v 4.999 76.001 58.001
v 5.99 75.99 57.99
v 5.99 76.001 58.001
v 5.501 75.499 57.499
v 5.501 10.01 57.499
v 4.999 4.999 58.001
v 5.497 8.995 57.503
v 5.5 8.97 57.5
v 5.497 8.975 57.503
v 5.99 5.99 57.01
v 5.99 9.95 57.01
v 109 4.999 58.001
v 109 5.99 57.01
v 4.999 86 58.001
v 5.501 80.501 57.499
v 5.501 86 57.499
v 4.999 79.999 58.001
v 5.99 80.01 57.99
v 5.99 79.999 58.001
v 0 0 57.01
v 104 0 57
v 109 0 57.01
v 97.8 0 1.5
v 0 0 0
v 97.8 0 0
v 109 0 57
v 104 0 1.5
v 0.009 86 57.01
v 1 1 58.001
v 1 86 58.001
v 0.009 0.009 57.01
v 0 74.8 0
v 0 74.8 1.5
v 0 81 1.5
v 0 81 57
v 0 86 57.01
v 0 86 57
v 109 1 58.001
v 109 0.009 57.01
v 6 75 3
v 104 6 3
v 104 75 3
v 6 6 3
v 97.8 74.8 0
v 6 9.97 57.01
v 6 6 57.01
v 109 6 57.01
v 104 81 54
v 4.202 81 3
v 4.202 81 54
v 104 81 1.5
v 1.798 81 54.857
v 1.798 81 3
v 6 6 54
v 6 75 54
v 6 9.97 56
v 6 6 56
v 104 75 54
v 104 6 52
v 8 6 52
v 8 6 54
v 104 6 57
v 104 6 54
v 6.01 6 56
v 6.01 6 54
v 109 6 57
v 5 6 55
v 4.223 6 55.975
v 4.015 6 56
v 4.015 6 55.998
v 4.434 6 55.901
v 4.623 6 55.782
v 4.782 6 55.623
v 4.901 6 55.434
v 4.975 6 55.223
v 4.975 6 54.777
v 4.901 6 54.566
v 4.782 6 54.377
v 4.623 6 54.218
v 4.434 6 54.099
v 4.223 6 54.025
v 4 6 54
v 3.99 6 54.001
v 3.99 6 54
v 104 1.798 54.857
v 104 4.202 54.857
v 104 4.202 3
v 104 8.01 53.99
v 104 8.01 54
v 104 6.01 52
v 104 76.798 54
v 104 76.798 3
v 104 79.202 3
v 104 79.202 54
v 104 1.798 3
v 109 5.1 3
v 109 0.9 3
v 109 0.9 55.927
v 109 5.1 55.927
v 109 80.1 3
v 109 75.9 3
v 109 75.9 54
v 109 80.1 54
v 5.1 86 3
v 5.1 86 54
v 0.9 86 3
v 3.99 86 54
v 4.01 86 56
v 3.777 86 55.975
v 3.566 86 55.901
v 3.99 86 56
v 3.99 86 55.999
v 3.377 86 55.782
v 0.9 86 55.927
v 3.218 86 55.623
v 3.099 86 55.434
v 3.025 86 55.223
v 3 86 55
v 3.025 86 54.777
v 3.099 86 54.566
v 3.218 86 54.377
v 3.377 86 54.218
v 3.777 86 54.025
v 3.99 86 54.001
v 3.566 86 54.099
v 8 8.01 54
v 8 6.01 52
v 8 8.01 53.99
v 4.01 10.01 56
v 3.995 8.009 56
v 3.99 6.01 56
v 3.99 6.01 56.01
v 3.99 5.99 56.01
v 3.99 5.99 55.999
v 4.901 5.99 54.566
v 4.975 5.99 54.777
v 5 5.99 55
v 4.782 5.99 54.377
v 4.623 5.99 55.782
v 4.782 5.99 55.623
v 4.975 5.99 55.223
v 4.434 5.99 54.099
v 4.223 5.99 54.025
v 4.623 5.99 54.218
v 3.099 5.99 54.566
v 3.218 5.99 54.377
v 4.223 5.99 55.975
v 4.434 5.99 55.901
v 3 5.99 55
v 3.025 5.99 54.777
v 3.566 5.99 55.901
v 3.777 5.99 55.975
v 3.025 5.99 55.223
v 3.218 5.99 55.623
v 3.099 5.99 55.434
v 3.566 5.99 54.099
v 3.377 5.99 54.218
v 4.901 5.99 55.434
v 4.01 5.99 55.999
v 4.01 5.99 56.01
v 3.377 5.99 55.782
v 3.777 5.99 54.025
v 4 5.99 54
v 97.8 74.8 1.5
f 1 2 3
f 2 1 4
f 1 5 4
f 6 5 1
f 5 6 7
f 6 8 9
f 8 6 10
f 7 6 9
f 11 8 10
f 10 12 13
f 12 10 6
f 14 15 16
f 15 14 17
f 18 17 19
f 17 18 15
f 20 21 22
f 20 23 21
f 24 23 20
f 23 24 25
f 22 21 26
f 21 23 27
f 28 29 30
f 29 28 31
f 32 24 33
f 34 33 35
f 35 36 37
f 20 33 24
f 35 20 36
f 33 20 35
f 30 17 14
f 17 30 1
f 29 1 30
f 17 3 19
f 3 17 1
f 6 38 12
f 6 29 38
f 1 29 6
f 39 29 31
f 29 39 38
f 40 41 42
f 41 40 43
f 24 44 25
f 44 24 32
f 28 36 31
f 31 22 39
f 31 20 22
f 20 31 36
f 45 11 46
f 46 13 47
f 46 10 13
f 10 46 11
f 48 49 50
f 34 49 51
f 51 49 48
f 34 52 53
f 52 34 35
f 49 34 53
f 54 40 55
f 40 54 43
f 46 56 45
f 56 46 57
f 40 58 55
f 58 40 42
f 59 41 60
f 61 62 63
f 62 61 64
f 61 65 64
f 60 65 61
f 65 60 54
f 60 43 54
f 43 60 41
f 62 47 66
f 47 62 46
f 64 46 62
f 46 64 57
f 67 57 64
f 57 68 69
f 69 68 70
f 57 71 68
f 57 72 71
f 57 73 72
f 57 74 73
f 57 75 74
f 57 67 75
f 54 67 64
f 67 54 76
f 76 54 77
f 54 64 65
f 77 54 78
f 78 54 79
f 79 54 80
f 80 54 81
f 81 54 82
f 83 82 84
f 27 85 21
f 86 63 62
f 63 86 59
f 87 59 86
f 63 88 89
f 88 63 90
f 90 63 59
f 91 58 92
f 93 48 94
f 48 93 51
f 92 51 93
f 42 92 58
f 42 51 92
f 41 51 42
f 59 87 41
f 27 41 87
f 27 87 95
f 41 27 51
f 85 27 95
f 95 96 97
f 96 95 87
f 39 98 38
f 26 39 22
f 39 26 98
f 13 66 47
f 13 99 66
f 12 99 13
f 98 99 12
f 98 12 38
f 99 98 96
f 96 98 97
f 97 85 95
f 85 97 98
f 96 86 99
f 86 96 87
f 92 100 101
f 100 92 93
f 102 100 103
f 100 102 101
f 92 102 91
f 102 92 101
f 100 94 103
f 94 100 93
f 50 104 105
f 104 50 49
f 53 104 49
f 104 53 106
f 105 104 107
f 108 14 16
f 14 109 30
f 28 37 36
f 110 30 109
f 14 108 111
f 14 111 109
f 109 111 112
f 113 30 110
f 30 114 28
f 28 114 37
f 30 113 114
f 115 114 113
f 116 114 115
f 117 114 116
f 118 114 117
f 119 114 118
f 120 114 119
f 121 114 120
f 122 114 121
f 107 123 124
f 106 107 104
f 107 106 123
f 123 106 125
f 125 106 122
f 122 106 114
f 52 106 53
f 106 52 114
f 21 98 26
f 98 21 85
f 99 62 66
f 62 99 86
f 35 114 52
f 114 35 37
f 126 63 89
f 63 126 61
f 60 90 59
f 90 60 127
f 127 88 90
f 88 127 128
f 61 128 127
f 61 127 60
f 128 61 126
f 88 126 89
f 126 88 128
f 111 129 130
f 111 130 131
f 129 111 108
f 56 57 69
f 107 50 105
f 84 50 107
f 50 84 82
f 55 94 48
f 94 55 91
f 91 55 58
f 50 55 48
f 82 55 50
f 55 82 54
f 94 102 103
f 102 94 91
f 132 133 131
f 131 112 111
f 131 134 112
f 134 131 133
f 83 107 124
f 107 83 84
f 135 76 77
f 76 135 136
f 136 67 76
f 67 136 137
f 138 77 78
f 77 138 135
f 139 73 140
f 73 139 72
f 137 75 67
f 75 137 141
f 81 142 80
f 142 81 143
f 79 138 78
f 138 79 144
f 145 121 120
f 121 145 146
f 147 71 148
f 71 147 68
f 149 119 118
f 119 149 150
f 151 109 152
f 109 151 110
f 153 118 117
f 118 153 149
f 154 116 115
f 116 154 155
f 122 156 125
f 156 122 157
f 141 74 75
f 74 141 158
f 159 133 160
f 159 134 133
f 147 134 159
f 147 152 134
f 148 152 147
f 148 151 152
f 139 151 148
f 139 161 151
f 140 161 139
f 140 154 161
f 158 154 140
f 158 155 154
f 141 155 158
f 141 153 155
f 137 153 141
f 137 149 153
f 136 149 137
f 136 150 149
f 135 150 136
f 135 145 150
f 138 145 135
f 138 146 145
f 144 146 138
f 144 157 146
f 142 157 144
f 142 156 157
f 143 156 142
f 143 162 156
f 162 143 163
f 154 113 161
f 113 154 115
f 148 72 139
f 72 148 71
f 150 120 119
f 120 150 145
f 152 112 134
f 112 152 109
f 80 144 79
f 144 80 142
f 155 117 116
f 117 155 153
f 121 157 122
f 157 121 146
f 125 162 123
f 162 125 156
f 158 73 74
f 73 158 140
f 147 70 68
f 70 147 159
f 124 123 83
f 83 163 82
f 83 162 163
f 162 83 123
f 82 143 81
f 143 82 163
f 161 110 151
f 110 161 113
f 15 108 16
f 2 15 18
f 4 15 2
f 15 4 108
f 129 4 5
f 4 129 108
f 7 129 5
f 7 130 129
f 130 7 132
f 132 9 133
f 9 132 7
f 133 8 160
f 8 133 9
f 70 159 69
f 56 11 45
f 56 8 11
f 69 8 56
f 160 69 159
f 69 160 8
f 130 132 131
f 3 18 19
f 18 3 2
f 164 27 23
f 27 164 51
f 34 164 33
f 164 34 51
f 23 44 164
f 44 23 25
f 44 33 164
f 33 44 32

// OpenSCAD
// ============================================================================
// cutlery_box.scad
// Graduated 3-chamber disposable-cutlery box (Option 3) — CUT-FROM-SOLID port
// of build_box.py, for a 120 x 120 x 120 mm printer (AOSEED).
//
// WHY THIS PORT EXISTS (the whole point):
//   The hand-mesh generator (build_box.py) could not keep the 1 mm rim chamfer
//   continuous across the female dovetail joints, because where a slot's flared
//   corner crosses the sloped chamfer it needs a true boolean intersection.
//   OpenSCAD HAS that boolean kernel, so here we do exactly the "cut-from-solid"
//   thing:
//      1. Build the ENTIRE box as ONE solid, WITH the chamfer already on it.
//      2. difference() out vertical dovetail prisms ( /_\ cross-section ),
//         running from just above the base plate up THROUGH the rim, to both
//         (a) form the sliding-dovetail joints, and
//         (b) split the box into 6 bed-sized pieces.
//   Because the cut is a real boolean through the already-chamfered solid, the
//   sloped chamfer<->slot edge is produced for free => the rim chamfer stays
//   CONTINUOUS across every joint, with none of the sliver hacks.
//
// ----------------------------------------------------------------------------
// HOW TO USE
//   In the app:  set `part` below (or use the Customizer dropdown), F5 to
//                preview, F6 to render, then File > Export > STL.
//   One piece (CLI):
//      openscad -o body_knife_A.stl -D 'part="knife_A"' cutlery_box.scad
//   ALL SIX (bash, run from this folder):
//      for p in knife_A knife_B fork_A fork_B spoon_A spoon_B; do \
//        openscad -o "body_$p.stl" -D "part=\"$p\"" cutlery_box.scad ; done
//   PNG preview of one piece:
//      openscad -o knife_B.png --imgsize=1400,1000 --autocenter --viewall \
//        -D 'part="knife_B"' cutlery_box.scad
//
//   Pieces are modelled in ASSEMBLED coordinates (floor-down, z=0 is the bed),
//   so importing all six STLs together shows the assembled box directly; your
//   slicer will auto-drop each one onto the plate for printing.
//
// BED SANITY: every piece is <= 120 mm in X, Y, Z.
//   Z = 58 mm. Widest piece = spoon at 117 mm (Y). A-halves reach 109 mm (X,
//   including the protruding dovetail key). All under 120.
//
// !! I could NOT run OpenSCAD to verify this file (no binary in my sandbox) !!
//   - The rim chamfer is a SMOOTH, true-45 bevel built from hull() frustums of
//     convex rectangles. Works in every OpenSCAD since ~2015 (incl. Homebrew
//     2021.01). No stepped staircase -- and, crucially, it makes box() a clean
//     well-formed solid so the per-part booleans resolve reliably (the old
//     14-slice staircase was fragile and CGAL was dropping the walls of the
//     interior parts, leaving only the key prisms => "floating boxes").
//   - roof() is still available behind USE_ROOF=true for those who have it
//     (2021.01+ snapshots); for THIS rectangular design it is identical, so it
//     is NOT required.
//   - After F6, check the console for "WARNING"/"not a valid 2-manifold".
//     If a tenon ever looks detached, bump EPS to 0.05.
// ============================================================================


/* [Part to render / export] */
part = "knife_A"; // [knife_A, knife_B, fork_A, fork_B, spoon_A, spoon_B, assembly]

/* [Chamfer method] */
// false = smooth hull() frustum bevel (default, any OpenSCAD); true = roof() (2021.01+)
USE_ROOF = false;

/* [Heights (mm)] */
BASE   = 3.0;     // floor / base-plate thickness
COMP_H = 55.0;    // interior wall height above the floor (cutlery stack depth)

/* [Walls (mm)] */
HOST_T   = 6.0;     // thickness of every wall (thick enough to host a dovetail)
HALF_LEN = 104.0;   // printed length of each half (A = near, B = far); <120 incl. key

/* [Chamber bays (mm)] */
N_COL     = 3;       // columns of cutlery per chamber
KNIFE_COL = 23.0;    // -> knife bay 69  (3 x 19 mm knives + play)
FORK_COL  = 33.0;    // -> fork  bay 99  (3 x 29 mm forks  + play)
SPOON_COL = 37.0;    // -> spoon bay 111 (3 x 34 mm spoons + play, trimmed <120)

/* [Dovetail joint (mm)] */
DT_DEPTH = 5.0;   // tail protrusion past the seam (male key depth)
DT_NECK  = 1.2;   // half-width at the seam face (narrow)
DT_FLARE = 2.1;   // half-width at the tip (wide -> locks)
DT_CLR   = 0.4;   // FLANK/seam slide clearance added to the female socket (do not change for fit)
DT_DEPTH_RELIEF = 0.3; // extra depth on the socket BACK only, so the tail tip never bottoms out

/* [Hidden-dovetail top cap / "hat" (mm)] */
// The dovetail otherwise shows its trapezoid outline on the TOP edge of the wall.
// To hide it, the MALE piece extends the wall's full-width top (chamfer included)
// across the key footprint -> a flush, continuous top. The FEMALE piece gets a
// matching top RECESS (cap footprint + CAP_CLR) so the cap drops straight in.
// Result: the top reads as one surface with a single straight seam line at the cap
// tip; the dovetail joinery lives entirely below the cap.
//
// SELF-SUPPORTING UNDERSIDE: the cap reaches the FULL wall width at the chamfer base
// (so the top edge reads as the wall extended, with NO recessed sliver on the outer
// face), and its underside is ONE planar ramp from the chamfer's OUTER CORNER
// (half-width HOST_T/2 at z = BODY_H-CHAMFER) down to the dovetail-neck half-width
// (CAP_FOOT) at CAP_SLANT_DEG from horizontal. No little horizontal step. The ramp
// reaching full width exactly at the chamfer base means "ramp top" == "chamfer base"
// (CAP_H is DERIVED). The FEMALE recess is the same ramp + CAP_CLR play.
// TRADEOFF: because the cap runs all the way to the outer corner, the female wall
// tapers to ~0 at z = BODY_H-CHAMFER -> a thin feather edge at the joint (gradual at
// CAP_SLANT_DEG, hidden inside the joint when assembled). Accepted per design intent.
CAP_SLANT_DEG = 50;     // cap underside ramp angle from horizontal (50 = self-supporting, long flare)
CAP_FOOT = DT_NECK;     // cap-underside half-width where it meets the dovetail neck
CAP_CLR = 0.3;          // slide clearance so the male cap seats into the female top recess

/* [Rim chamfer (mm)] */
CHAMFER = 1.0;    // 45-deg comfort break broken along the top wall edges

/* [Base half-lap / anti-warp (mm)] */
// Neighbouring base plates overlap as a HORIZONTAL half-lap (shiplap) at mid-base
// height, so corners stay coplanar (no lift/protrusion). Horizontal lap faces do
// NOT bind the vertical-drop assembly. Shingle direction: A->B and knife->fork->spoon.
LAP_LEN = 6;        // overlap past the A/B seam and the knife/fork seam
LAP_LEN_FS = 2;     // overlap past the fork/SPOON seam -- SMALLER: spoon is the
                    // tightest piece (117mm of the 120mm bed); a 6mm lap there
                    // would push spoon to 123mm. 2mm keeps spoon at 119mm.
LAP_Z   = BASE/2;   // 1.5 -- horizontal split height of the lap (bottom vs top half)
LAP_CLR = 0.2;      // in-plane clearance so the shelf isn't a press fit

/* [Lid — box features that receive a flat ORDERED clear sheet] */
// The lid itself is NOT printed: it's a flat ~2 mm PETG/Tritan sheet, bullnose-polished
// edges (r=LID_EDGE_R), ordered to size. We only model the box features that receive it.
LID_T            = 2.0;   // ordered sheet thickness
LID_EDGE_R       = 1.0;   // ordered sheet bullnose edge radius (for the sheet order spec)
LID_PLAY         = 0.4;   // total vertical play in the hinge groove (sheet + this)
LID_RECESS       = 2.0;   // lid TOP sits this far BELOW the rim, so the journal pocket is fully
                          // capped (rim caps the bullnose -> retains the lid when raised; tilt-in)
HINGE_AT_MINUS_X = true;  // hinge on the -x (303mm) end wall; clip on +x. (flip = mirror; default delivered)
// perimeter support ledge (lid underside rests on it at z = BODY_H-LID_T)
LEDGE_W          = 2.0;   // ledge inward protrusion (its underside ramps back at 45 deg -> self-supporting)
GROOVE_END_INSET = 0.0;   // journal runs the full chamber width, right to the corners
GROOVE_TAPER     = 4.0;   // y-length over which the eased mouth tapers out at each groove end
// hinge journal (cut into the inner face of the hinge end wall, CONTINUOUS along the long edge)
GROOVE_DEPTH     = 3.0;   // 2mm lead-in slot + 1mm pocket radius -> journal sits 2mm back from the
                          // face so its cap clears the swing relief and RETAINS the lid
GROOVE_POCKET_R  = 1.0;   // journal half-cylinder radius (the bullnose sheet edge rolls in it)
// clip latch (one localized retainer, centered on the clip end wall)
CLIP_W           = 18.0;  // clip width
CLIP_LIP         = 0.4;   // retaining overhang (0.3 light .. 0.6 firm)
CLIP_RAMP_H      = 1.6;   // cam-ramp height above the rim (press-to-close)
// finger scallop (semicircular dish in the rim, centered on & aligned with the clip)
SCALLOP_W        = 16.0;  // scallop width
SCALLOP_DEPTH    = 6.0;   // how far it dishes down from the rim


/* [Hidden] */
EPS      = 0.01;          // tiny overlap so abutting solids fuse cleanly in CGAL
// Upper-chamber pieces (fork, spoon) were cut by a cell plane laid EXACTLY on the
// divider wall's far face (the lower chamber owns that wall). intersection() along a
// plane coincident with an existing box face makes CGAL leave a ZERO-THICKNESS copy
// of the wall face -> edge-manifold + "watertight" but degenerate (OpenSCAD shows it
// as a blue back-face; Tinkercad thickens it into a phantom block). SEAM_EPS nudges
// those cut planes a hair INTO the open bay so they no longer coincide with any box
// face -> no flap. 0.02 mm is physically nothing but is well clear of CGAL's tolerance.
SEAM_EPS = 0.02;
CUT_OVER = 1.0;           // how far dovetail cutters overshoot the rim (clean cut)

BODY_H    = BASE + COMP_H;     // 58  total height
END_WALL  = HOST_T;            // end walls are dovetail hosts too -> equally thick
TOTAL_LEN = 2 * HALF_LEN;      // 208 assembled length (end wall .. end wall)

// hidden-cap ramp geometry (derived).
//   CAP_HW    = cap MAX half-width = HOST_T/2 (the full wall edge) at the chamfer base.
//   CAP_RISE  = vertical height of the self-supporting CAP_SLANT_DEG underside ramp.
//   CAP_ZRAMP = where the cap reaches full width = the chamfer base (BODY_H-CHAMFER), so
//               the ramp runs straight to the chamfer OUTER CORNER (no horizontal step).
//   CAP_ZBOT  = cap bottom = ramp start; CAP_H derived from it (for reference/report).
//   CAP_ZRAMP_R = recess ramp top, shifted down by CAP_CLR so the recess ramp stays
//               parallel to the cap ramp with uniform play.
CAP_HW      = HOST_T/2;   // cap reaches the FULL wall edge at the chamfer base
CAP_RISE    = (CAP_HW - CAP_FOOT) * tan(CAP_SLANT_DEG);
CAP_ZRAMP   = BODY_H - CHAMFER;               // full width exactly at the chamfer base / outer corner
CAP_ZBOT    = CAP_ZRAMP - CAP_RISE;
CAP_H       = BODY_H - CAP_ZBOT;              // derived; reported
CAP_ZRAMP_R = CAP_ZRAMP;   // recess ramp ALSO tops at the chamfer corner (mirror the cap) -> no vertical lip
// sanity checks
assert(CAP_ZBOT > BASE + 1,
       "cap zone dips too low -- raise CAP_SLANT_DEG");
assert(CAP_HW >= DT_FLARE,
       "cap too narrow to cover the dovetail tail");

// NOTE: lid-derived constants are defined BELOW the Y-layout block, because some of
// them (INTERIOR_Y0/Y1, CLIP_CY) depend on OUTER_L / OUTER_R / EXT_W. See "lid derived".

// bay widths
KNIFE_BAY = N_COL * KNIFE_COL; // 69
FORK_BAY  = N_COL * FORK_COL;  // 99
SPOON_BAY = N_COL * SPOON_COL; // 111

// ---- Y layout (width direction): wall | bay | divider | bay | divider | bay | wall
KNIFE_Y0 = 0;
KNIFE_Y1 = HOST_T + KNIFE_BAY + HOST_T;        // 0..81   (outer wall + bay + divider)
FORK_Y0  = KNIFE_Y1;                           // 81
FORK_Y1  = FORK_Y0 + FORK_BAY + HOST_T;        // 81..186 (bay + divider)
SPOON_Y0 = FORK_Y1;                            // 186
SPOON_Y1 = SPOON_Y0 + SPOON_BAY + HOST_T;      // 186..303(bay + outer wall)
EXT_W    = SPOON_Y1;                           // 303 total width

// lengthwise wall Y-bands [y0,y1] (host the A/B dovetails) + their centers
OUTER_L  = [0, HOST_T];                                       // [0,6]    c=3
DIV_KF   = [HOST_T + KNIFE_BAY, HOST_T + KNIFE_BAY + HOST_T]; // [75,81]  c=78
DIV_FS   = [FORK_Y0 + FORK_BAY, FORK_Y0 + FORK_BAY + HOST_T]; // [180,186]c=183
OUTER_R  = [SPOON_Y1 - HOST_T, SPOON_Y1];                     // [297,303]c=300

// ---- lid derived ---- (placed AFTER OUTER_L/OUTER_R/EXT_W so nothing is forward-referenced)
LID_TOP_Z   = BODY_H - LID_RECESS;        // 56  lid TOP (recessed); rim z=58 rises LID_RECESS above it
LID_Z_UNDER = LID_TOP_Z - LID_T;          // 54  lid underside / ledge top / lowered-divider top
POCKET_CZ   = LID_TOP_Z - LID_T/2;        // 55  journal centre (lid mid) -> pocket top = LID_TOP_Z = capped
// hinge end-wall inner face x + inward direction; clip end-wall inner face x + inward dir
HINGE_INX   = HINGE_AT_MINUS_X ? END_WALL : TOTAL_LEN - END_WALL;       // 6  (default)
HINGE_IN    = HINGE_AT_MINUS_X ? 1 : -1;  // interior direction from the hinge wall (+x default)
CLIP_INX    = HINGE_AT_MINUS_X ? TOTAL_LEN - END_WALL : END_WALL;       // 202 (default)
CLIP_IN     = HINGE_AT_MINUS_X ? -1 : 1;  // interior direction from the clip wall (-x default)
POCKET_CX   = HINGE_INX - HINGE_IN*(GROOVE_DEPTH - GROOVE_POCKET_R);    // 5  pocket centre x (INTO the wall)
INTERIOR_Y0 = OUTER_L[1];                 // 6   inner face of the -y short wall
INTERIOR_Y1 = OUTER_R[0];                 // 297 inner face of the +y short wall
CLIP_CY     = EXT_W/2;                     // 151.5 clip/scallop centre (in the fork chamber)
assert(POCKET_CZ - GROOVE_POCKET_R > BASE + 1,
       "journal dips too low -- reduce LID_RECESS or LID_T");
assert(POCKET_CZ + GROOVE_POCKET_R <= LID_TOP_Z + EPS,
       "journal not capped -- lower the lid (raise LID_RECESS) or shrink GROOVE_POCKET_R");
// NOTE: with LID_RECESS the lid underside (and lowered dividers) sit BELOW CAP_ZBOT. That is
// intended: the inner dividers are cut flat below the cap zone (their hidden caps are removed,
// but the lid covers them); the perimeter/end-wall caps are untouched (full-height walls).

// the three OPEN bays are rectangular holes in the wall footprint:
//   footprint = outer rectangle MINUS these bays  (== the 6 walls; verified).
// The smooth chamfer is built from exactly this decomposition.
BAY_X0 = END_WALL;              // 6
BAY_X1 = TOTAL_LEN - END_WALL;  // 202
BAYS = [
    [BAY_X0, BAY_X1, HOST_T,   HOST_T + KNIFE_BAY],   // knife bay [6,202] x [6,75]
    [BAY_X0, BAY_X1, FORK_Y0,  FORK_Y0 + FORK_BAY],   // fork  bay [6,202] x [81,180]
    [BAY_X0, BAY_X1, SPOON_Y0, SPOON_Y0 + SPOON_BAY], // spoon bay [6,202] x [186,297]
];

YC_OUTL  = OUTER_L[0] + HOST_T/2;   // 3   outer-left wall center
YC_DIVKF = DIV_KF[0]  + HOST_T/2;   // 78  knife/fork divider center
YC_DIVFS = DIV_FS[0]  + HOST_T/2;   // 183 fork/spoon divider center
YC_OUTR  = OUTER_R[0] + HOST_T/2;   // 300 outer-right wall center

// seams
AB_SEAM = HALF_LEN;               // 104  A/B length seam (x)
SEAM_KF = FORK_Y0;                // 81   knife/fork width seam (y)
SEAM_FS = SPOON_Y0;              // 186  fork/spoon width seam (y)
ENDC_A  = END_WALL/2;             // 3    A end-wall center (x) -> chamber dovetails
ENDC_B  = TOTAL_LEN - END_WALL/2; // 205  B end-wall center (x)


// ============================================================================
// 2D wall footprint (cross-section of all walls, constant in z for the straight
// part). Union of: 2 full-width end walls + 4 lengthwise walls between them.
// ============================================================================
module wall_footprint_2d() {
    // footprint = outer rectangle minus the 3 open bays  (== the 6 walls)
    difference() {
        square([TOTAL_LEN, EXT_W]);
        for (b = BAYS) translate([b[0], b[2]]) square([b[1] - b[0], b[3] - b[2]]);
    }
}

// ============================================================================
// The full chamfered box solid = base plate + walls with a continuous 1 mm
// top-rim chamfer. Built ONCE; every piece is carved out of this.
// ============================================================================
module chamfer_cap() {
    // SMOOTH 45 rim chamfer over z[BODY_H-CHAMFER, BODY_H], in absolute coords.
    zm = BODY_H - CHAMFER;
    if (USE_ROOF) {
        // exact straight-skeleton roof, capped at CHAMFER height (needs roof()).
        intersection() {
            translate([0,0,zm]) roof() wall_footprint_2d();
            translate([0,0,zm]) linear_extrude(CHAMFER + EPS) wall_footprint_2d();
        }
    } else {
        // DEFAULT: true 45 bevel as hull() frustums of CONVEX rectangles -> smooth
        // AND a clean manifold.  Since footprint = outer - bays, the chamfer of the
        // footprint = (outer rectangle beveled inward) MINUS (each bay beveled so it
        // grows toward the top, which bevels every bay-facing rim).  All hull()s are
        // on convex rectangles, so nothing gets convex-filled.
        difference() {
            // outer perimeter frustum: full outer rect at zm -> inset by CHAMFER at top
            hull() {
                translate([0,0,zm])     linear_extrude(0.001) square([TOTAL_LEN, EXT_W]);
                translate([0,0,BODY_H]) linear_extrude(0.001) offset(delta=-CHAMFER) square([TOTAL_LEN, EXT_W]);
            }
            // each bay grows by CHAMFER toward the top -> bevels its surrounding rim.
            // (overshoots z a hair past both ends so the cut is clean.)
            for (b = BAYS)
                hull() {
                    translate([0,0,zm-EPS])     linear_extrude(0.001)
                        translate([b[0],b[2]]) offset(delta=-EPS)        square([b[1]-b[0], b[3]-b[2]]);
                    translate([0,0,BODY_H+EPS]) linear_extrude(0.001)
                        translate([b[0],b[2]]) offset(delta=CHAMFER+EPS) square([b[1]-b[0], b[3]-b[2]]);
                }
        }
    }
}

module box() {
    zm = BODY_H - CHAMFER;
    union() {
        cube([TOTAL_LEN, EXT_W, BASE]);                                        // base plate z[0,3]
        translate([0,0,BASE]) linear_extrude(zm - BASE + EPS) wall_footprint_2d(); // straight walls z[3,57]
        chamfer_cap();                                                         // smooth chamfer z[57,58]
    }
}

// ============================================================================
// Dovetail prisms ( /_\ ). Vertical, z[BASE, BODY_H+CUT_OVER] so they cut
// through the rim but leave the base plate continuous. The near face is pushed
// back EPS so a male key always fuses to its wall.
//   male key   : half_n=DT_NECK,         half_f=DT_FLARE
//   female slot: half_n=DT_NECK+DT_CLR,  half_f=DT_FLARE+DT_CLR
// ============================================================================
module dt_prism_X(seam_x, yc, half_n, half_f) {   // perpendicular to X, grows +X
    translate([0,0,BASE]) linear_extrude(BODY_H - BASE + CUT_OVER)
        polygon([[seam_x - EPS,        yc - half_n],
                 [seam_x + DT_DEPTH,   yc - half_f],
                 [seam_x + DT_DEPTH,   yc + half_f],
                 [seam_x - EPS,        yc + half_n]]);
}
module dt_prism_Y(seam_y, xc, half_n, half_f) {   // perpendicular to Y, grows +Y
    translate([0,0,BASE]) linear_extrude(BODY_H - BASE + CUT_OVER)
        polygon([[xc - half_n, seam_y - EPS],
                 [xc - half_f, seam_y + DT_DEPTH],
                 [xc + half_f, seam_y + DT_DEPTH],
                 [xc + half_n, seam_y - EPS]]);
}
module ab_key   (yc)        { dt_prism_X(AB_SEAM, yc, DT_NECK, DT_FLARE); }
module ch_key   (seam_y, xc){ dt_prism_Y(seam_y, xc, DT_NECK, DT_FLARE); }

// Female sockets = male + DT_CLR on the flanks/seam (unchanged), PLUS a straight
// back-face relief of DT_DEPTH_RELIEF so the tail tip never bottoms out. The
// relief is a rectangle tacked onto the trapezoid's tip at the SAME flare width,
// so the angled flank faces (and their 0.4 mm slide clearance) are untouched.
module ab_socket(yc) {
    dt_prism_X(AB_SEAM, yc, DT_NECK + DT_CLR, DT_FLARE + DT_CLR);
    translate([0,0,BASE]) linear_extrude(BODY_H - BASE + CUT_OVER)
        translate([AB_SEAM + DT_DEPTH, yc - (DT_FLARE + DT_CLR)])
            square([DT_DEPTH_RELIEF, 2*(DT_FLARE + DT_CLR)]);          // back relief, +X
}
module ch_socket(seam_y, xc) {
    dt_prism_Y(seam_y, xc, DT_NECK + DT_CLR, DT_FLARE + DT_CLR);
    translate([0,0,BASE]) linear_extrude(BODY_H - BASE + CUT_OVER)
        translate([xc - (DT_FLARE + DT_CLR), seam_y + DT_DEPTH])
            square([2*(DT_FLARE + DT_CLR), DT_DEPTH_RELIEF]);          // back relief, +Y
}

// ===== hidden-dovetail top cap ("hat"), SELF-SUPPORTING underside ===============
// MALE cap: a FULL-wall-width hat whose underside is ONE planar ramp from the chamfer's
// OUTER CORNER (half-width CAP_HW = HOST_T/2 at CAP_ZRAMP = BODY_H-CHAMFER) down to the
// dovetail-neck half-width (CAP_FOOT) at CAP_SLANT_DEG from horizontal -> the self-
// supporting shoulder, running straight to the corner (no horizontal step). Built as
// hull(narrow bottom slab buried in the tail neck, full-width top slab through the rim);
// box() trims it to the wall and adds the continuous rim chamfer for free, so the outer
// top edge reads as the wall extended (no recessed sliver). The protruding NOSE is left
// SQUARE (vertical) -- hidden in the female socket when assembled.
// TRADEOFF: the female wall tapers to ~0 at z=BODY_H-CHAMFER (a thin feather edge at the
// joint, gradual at CAP_SLANT_DEG) -- accepted per design intent.
module ab_cap(yc) {   // A/B seam, grows +X past the seam (length direction)
    hull() {
        translate([AB_SEAM - EPS, yc - CAP_FOOT, CAP_ZBOT])
            cube([DT_DEPTH + EPS, 2*CAP_FOOT, EPS]);
        translate([AB_SEAM - EPS, yc - CAP_HW,   CAP_ZRAMP])
            cube([DT_DEPTH + EPS, 2*CAP_HW, (BODY_H + CUT_OVER) - CAP_ZRAMP]);
    }
}
module ch_cap(seam_y, xc) {   // chamber seam, grows +Y past the seam (in the end wall)
    hull() {
        translate([xc - CAP_FOOT, seam_y - EPS, CAP_ZBOT])
            cube([2*CAP_FOOT, DT_DEPTH + EPS, EPS]);
        translate([xc - CAP_HW,   seam_y - EPS, CAP_ZRAMP])
            cube([2*CAP_HW, DT_DEPTH + EPS, (BODY_H + CUT_OVER) - CAP_ZRAMP]);
    }
}
// FEMALE recess: the SAME ramp grown by CAP_CLR (flanks, tip, floor, and ramp shifted down
// by CAP_CLR so it stays parallel) -> the cap seats with uniform slide clearance. It opens
// to the wall edge (and a hair past, into air) so the cap's full-width corner drops in;
// this is what leaves the thin female feather at the top (accepted). Open upward + toward seam.
module ab_cap_neg(yc) {
    hull() {
        translate([AB_SEAM - EPS, yc - (CAP_FOOT + CAP_CLR), CAP_ZBOT - CAP_CLR])
            cube([DT_DEPTH + CAP_CLR + EPS, 2*(CAP_FOOT + CAP_CLR), EPS]);
        translate([AB_SEAM - EPS, yc - (CAP_HW + EPS), CAP_ZRAMP_R])
            cube([DT_DEPTH + CAP_CLR + EPS, 2*(CAP_HW + EPS), (BODY_H + CUT_OVER + 1) - CAP_ZRAMP_R]);
    }
}
module ch_cap_neg(seam_y, xc) {
    hull() {
        translate([xc - (CAP_FOOT + CAP_CLR), seam_y - EPS, CAP_ZBOT - CAP_CLR])
            cube([2*(CAP_FOOT + CAP_CLR), DT_DEPTH + CAP_CLR + EPS, EPS]);
        translate([xc - (CAP_HW + EPS), seam_y - EPS, CAP_ZRAMP_R])
            cube([2*(CAP_HW + EPS), DT_DEPTH + CAP_CLR + EPS, (BODY_H + CUT_OVER + 1) - CAP_ZRAMP_R]);
    }
}

// rectangular cell (x[xa,xb], y[ya,yb], full height + margin) used to split pieces
module cell(xa, xb, ya, yb) {
    translate([xa, ya, -1]) cube([xb - xa, yb - ya, BODY_H + 11]);
}

// ===== base half-lap (shiplap) =================================================
// HORIZONTAL lap at mid-base height: the shelf-owner keeps its BOTTOM half
// (z 0..LAP_Z) extending LAP_LEN past the seam; the neighbour has its bottom half
// REMOVED there (keeps only the top half) and lands flat on the shelf. Horizontal
// faces => no binding during the vertical drop. Shelves live entirely in the base
// (z < BASE), well clear of the wall dovetails (z >= BASE).
// Shingle = FEMALE-first (matches the no-notch dovetail assembly order, which
// lowers the male piece onto the female): the B half owns the A/B shelf (grows
// -X into A) and the UPPER chamber (fork, spoon) owns the chamber shelf (grows
// -Y into the lower chamber).  Order: spoon, fork, knife; B before A.
module lap_shelf_X(y0, y1) {                 // B-side shelf, grows -X into A past AB_SEAM
    // +EPS past AB_SEAM so the shelf interpenetrates (not just abuts) its own B body -> fuses cleanly.
    translate([AB_SEAM - LAP_LEN, y0, 0]) cube([LAP_LEN + EPS, y1 - y0, LAP_Z]);
}
module lap_neg_X(y0, y1) {                   // A-side: remove bottom half to receive it
    translate([AB_SEAM - LAP_LEN - LAP_CLR, y0 - EPS, -EPS])
        cube([LAP_LEN + LAP_CLR + EPS, (y1 - y0) + 2*EPS, LAP_Z + EPS]);
}
module lap_shelf_Y(seam_y, x0, x1, ln=LAP_LEN) {   // upper-chamber shelf, grows -Y into lower
    // grows -Y by `ln` into the lower chamber AND +Y by 2*SEAM_EPS past the seam so it
    // always overlaps the (SEAM_EPS-nudged) body floor and stays fused -> no floating shelf.
    translate([x0, seam_y - ln, 0]) cube([x1 - x0, ln + 2*SEAM_EPS, LAP_Z]);
}
module lap_neg_Y(seam_y, x0, x1, ln=LAP_LEN) {     // lower-chamber: remove bottom half
    translate([x0 - EPS, seam_y - ln - LAP_CLR, -EPS])
        cube([(x1 - x0) + 2*EPS, ln + LAP_CLR + EPS, LAP_Z + EPS]);
}

// ============================================================================
// LID FEATURES (receive a flat ORDERED clear sheet; the sheet is not printed).
// All features live at the TOP (z >= ~52), ABOVE the dovetail engagement, the half-lap
// (z<1.5) and most of the hat, so the vertical-drop assembly and joints are untouched.
// EPS overlaps throughout; no coincident coplanar faces with the existing walls.
// Default orientation: HINGE on the -x end wall (A pieces), CLIP on the +x end wall
// (B pieces), clip+scallop centred on the fork (middle) chamber.
// ============================================================================

// --- perimeter support ledge: 45-deg self-supporting brackets; rest face at LID_Z_UNDER.
//     Runs along the CLIP end wall + the two short outer walls. (Hinge wall uses the groove.)
//     Built as hull(thin top edge, wall column) -> a triangular bracket whose underside is
//     a 45-deg ramp (prints floor-down with no support). ADDED to each piece (clipped by cell).
//     Each run is INSET by LEDGE_W from the perpendicular walls so the three brackets never
//     overlap at a corner and the wall's normal chamfer wraps every corner uninterrupted.
module lid_ledge() {
    cy0 = INTERIOR_Y0 + LEDGE_W;  cy1 = INTERIOR_Y1 - LEDGE_W;  cyl = cy1 - cy0;   // clip-run y span (inset)
    sx0 = END_WALL    + LEDGE_W;  sxl = (TOTAL_LEN - 2*END_WALL) - 2*LEDGE_W;       // short-run x span (inset)
    // clip end wall (x = CLIP_INX), bracket protrudes toward interior (CLIP_IN)
    hull() {
        translate([CLIP_INX + CLIP_IN*LEDGE_W, cy0, LID_Z_UNDER - EPS]) cube([EPS, cyl, EPS]);
        translate([CLIP_INX - EPS,             cy0, LID_Z_UNDER - LEDGE_W]) cube([2*EPS, cyl, LEDGE_W]);
    }
    // OUTER_L short wall (y = INTERIOR_Y0), bracket protrudes +y
    hull() {
        translate([sx0, INTERIOR_Y0 + LEDGE_W, LID_Z_UNDER - EPS]) cube([sxl, EPS, EPS]);
        translate([sx0, INTERIOR_Y0 - EPS,     LID_Z_UNDER - LEDGE_W]) cube([sxl, 2*EPS, LEDGE_W]);
    }
    // OUTER_R short wall (y = INTERIOR_Y1), bracket protrudes -y
    hull() {
        translate([sx0, INTERIOR_Y1 - LEDGE_W, LID_Z_UNDER - EPS]) cube([sxl, EPS, EPS]);
        translate([sx0, INTERIOR_Y1 - EPS,     LID_Z_UNDER - LEDGE_W]) cube([sxl, 2*EPS, LEDGE_W]);
    }
}

// --- hinge groove: a lead-in slot + a journal half-cylinder pocket, CAPPED at the recessed
//     lid top (LID_TOP_Z). The rim (z[LID_TOP_Z,BODY_H]) caps the bullnose so the lid is
//     RETAINED when raised. Insertion is TILT-IN: raise the lid to the open angle, slide the
//     bullnose under the cap into the journal, swing down to close. A 45-deg mouth-ease
//     relieves the cap's inner-bottom edge (corner at HINGE_INX, LID_TOP_Z) so the lid clears
//     as it swings; the relief TAPERS to nothing over GROOVE_TAPER at each end (clean corners).
//     CONTINUOUS along the long edge (y ~8..295); shaves only the top inner tips of the two
//     chamber dovetails -- engagement below the journal and the ~3mm outer wall remain.
// Relief = ONE straight ramp from the journal's inner-top (POCKET_CX, LID_TOP_Z) up to the
// inner rim (HINGE_INX, BODY_H). No kink; the ~45-deg ramp is self-supporting (prints clean);
// the cap stays full directly over the bullnose (x=POCKET_CX) so retention survives; the relief
// grows toward the inner edge, matching the lid's rotation about the journal.
module mouth_tri() {
    polygon([[POCKET_CX,                LID_TOP_Z - EPS],
             [HINGE_INX + HINGE_IN*EPS, LID_TOP_Z - EPS],
             [HINGE_INX + HINGE_IN*EPS, BODY_H + EPS]]);
}
module mouth_slab(yc, dy) {                          // thin ramp slice centred at yc
    translate([0, yc - dy/2, 0]) rotate([90,0,0]) translate([0,0,-dy]) linear_extrude(dy) mouth_tri();
}
module mouth_taper(yApex, yFull) {                   // relief tapers to nothing at yApex (the ramp apex)
    hull() {
        mouth_slab(yFull, 2*EPS);
        translate([POCKET_CX - EPS, yApex - EPS, LID_TOP_Z - EPS]) cube([2*EPS, 2*EPS, 2*EPS]);
    }
}
module hinge_groove() {
    gy0 = INTERIOR_Y0 + GROOVE_END_INSET;            // 8    start (inset past the corner chamfer)
    gy1 = INTERIOR_Y1 - GROOVE_END_INSET;            // 295  end
    sx0 = min(POCKET_CX, HINGE_INX);  sx1 = max(POCKET_CX, HINGE_INX);   // x[4,6]: 2mm lead-in
    // lead-in slot (sheet thickness, capped at the lid top) from the journal out to the inner face
    translate([sx0 - EPS, gy0, LID_Z_UNDER]) cube([sx1 - sx0 + 2*EPS, gy1 - gy0, LID_TOP_Z - LID_Z_UNDER]);
    // journal half-cylinder 2mm back from the face -> its cap (x[3,5]) clears the relief => retains the lid
    translate([POCKET_CX, gy0 - EPS, POCKET_CZ]) rotate([-90,0,0]) cylinder(h = gy1 - gy0 + 2*EPS, r = GROOVE_POCKET_R, $fn = 28);
    // eased mouth (relieves the cap inner-bottom corner): full middle prism + tapered ends
    mt = min(GROOVE_TAPER, (gy1 - gy0)/2 - EPS);
    translate([0, gy0 + mt, 0]) rotate([90,0,0]) translate([0,0,-((gy1 - mt) - (gy0 + mt))]) linear_extrude((gy1 - mt) - (gy0 + mt)) mouth_tri();
    mouth_taper(gy0, gy0 + mt);                       // taper out at the -y corner
    mouth_taper(gy1, gy1 - mt);                       // taper out at the +y corner
}

// --- lower the inner chamber dividers to the lid underside (mid-support, no sag).
//     Removes the divider top over the full length; outer walls keep full height.
module divider_lower() {
    // x-span is the CHAMBER BAY only [BAY_X0, BAY_X1] (+EPS overlap into the end walls so the
    // cut is manifold). The end/outer walls keep their full BODY_H tops; only the two INNER
    // dividers (DIV_KF, DIV_FS) are lowered.
    translate([BAY_X0 - EPS, DIV_KF[0], LID_Z_UNDER]) cube([BAY_X1 - BAY_X0 + 2*EPS, HOST_T, BODY_H - LID_Z_UNDER + CUT_OVER]);
    translate([BAY_X0 - EPS, DIV_FS[0], LID_Z_UNDER]) cube([BAY_X1 - BAY_X0 + 2*EPS, HOST_T, BODY_H - LID_Z_UNDER + CUT_OVER]);
}

// --- retaining clip (ADDED): a lip on the clip end wall, centred on CLIP_CY, that overhangs
//     the RECESSED lid top (LID_TOP_Z) by CLIP_LIP and holds it down. A lead-in ramp above the
//     lip (up to LID_TOP_Z+CLIP_RAMP_H, still below the rim) cams the lid under as it swings
//     closed. Anchored into the wall (x = CLIP_INX-CLIP_IN*HOST_T/2). Added AFTER the scallop
//     cut so the scallop never undercuts it. No longer protrudes above the rim.
module lid_clip() {
    translate([0, CLIP_CY - CLIP_W/2, 0]) rotate([90,0,0]) translate([0,0,-CLIP_W]) linear_extrude(CLIP_W)
        polygon([[CLIP_INX - CLIP_IN*HOST_T/2, LID_TOP_Z - 0.8],         // anchor low, into the wall (fuse)
                 [CLIP_INX + CLIP_IN*CLIP_LIP, LID_TOP_Z],               // lip tip: overhang over the lid top
                 [CLIP_INX + CLIP_IN*CLIP_LIP, LID_TOP_Z + 0.4],         // lip front
                 [CLIP_INX - CLIP_IN*HOST_T/2, LID_TOP_Z + CLIP_RAMP_H]]);// lead-in ramp up into the wall
}

// --- finger scallop (CUT): a semicircular dish in the rim's INNER edge at the clip, so a
//     fingertip reaches under the lid edge to release it. Interior half only (does not
//     touch the wall body or the clip's anchor).
module lid_scallop() {
    intersection() {
        translate([CLIP_INX, CLIP_CY, BODY_H - SCALLOP_DEPTH]) cylinder(h = SCALLOP_DEPTH + EPS, r = SCALLOP_W/2, $fn = 40);
        translate([CLIP_INX + (CLIP_IN<0 ? -SCALLOP_W : 0), CLIP_CY - SCALLOP_W, BODY_H - SCALLOP_DEPTH - EPS])
            cube([SCALLOP_W, 2*SCALLOP_W, SCALLOP_DEPTH + 2*EPS]);
    }
}

// ============================================================================
// The six pieces.  piece = intersection(box, cell + own male keys) - own sockets
//   A halves are MALE on the A/B seam (keep the key); B halves are FEMALE (slot).
//   On a chamber seam the LEFT chamber is male (+Y), the right chamber is female.
// ============================================================================
// Base half-lap shingling (FEMALE-first, Option 1):
//   A/B seam  -> the B half owns the bottom shelf (grows -X), A has the negative.
//   chamber   -> the UPPER chamber (fork, spoon) owns the shelf (grows -Y); the
//                lower chamber (knife, fork) has the negative.
//   Assembly order: spoon, fork, knife; B before A (male lowered onto female).
// Center crossings (104,81)&(104,186): the CHAMBER shelf (fork_A / spoon_A) owns the
//   crossing square; the B-half A/B shelf (knife_B / fork_B) is CLIPPED short of the
//   chamber seam by LAP_LEN so two shelves never collide.
module knife_A() {                                       // placed LAST; receives everything
    difference() {
        union() {
            intersection() {
                box();
                union() {
                    cell(-1, AB_SEAM, KNIFE_Y0 - 1, KNIFE_Y1);
                    ab_key(YC_OUTL); ab_key(YC_DIVKF); ch_key(SEAM_KF, ENDC_A);
                    ab_cap(YC_OUTL); ab_cap(YC_DIVKF); ch_cap(SEAM_KF, ENDC_A);  // hide tops (male)
                }
            }
            intersection() { lid_ledge(); cell(-1, AB_SEAM, KNIFE_Y0 - 1, KNIFE_Y1); }  // lid support ledge
        }
        lap_neg_X(KNIFE_Y0, KNIFE_Y1);            // receive knife_B's A/B shelf
        lap_neg_Y(SEAM_KF, 0, AB_SEAM);           // receive fork_A's chamber shelf
        hinge_groove(); divider_lower(); lid_scallop();   // lid cuts (groove hits A pieces; divider/scallop where present)
    }
}

module knife_B() {
    difference() {
        union() {
            intersection() {
                box();
                union() {
                    cell(AB_SEAM, TOTAL_LEN + 1, KNIFE_Y0 - 1, KNIFE_Y1);
                    ch_key(SEAM_KF, ENDC_B);
                    ch_cap(SEAM_KF, ENDC_B);                // hide top (male, chamber)
                }
            }
            lap_shelf_X(KNIFE_Y0, KNIFE_Y1 - LAP_LEN);  // A/B shelf -> knife_A (CLIPPED at y=81 crossing)
            intersection() { lid_ledge(); cell(AB_SEAM, TOTAL_LEN + 1, KNIFE_Y0 - 1, KNIFE_Y1); }  // lid support ledge
        }
        ab_socket(YC_OUTL); ab_socket(YC_DIVKF);
        ab_cap_neg(YC_OUTL); ab_cap_neg(YC_DIVKF);      // top recesses to receive knife_A's caps (female)
        lap_neg_Y(SEAM_KF, AB_SEAM, TOTAL_LEN);         // receive fork_B's chamber shelf
        hinge_groove(); divider_lower(); lid_scallop();   // lid cuts
    }
}

module fork_A() {
    difference() {
        union() {
            intersection() {
                box();
                union() {
                    cell(-1, AB_SEAM, FORK_Y0 + SEAM_EPS, FORK_Y1);  // -Y cut nudged off the divider face
                    ab_key(YC_DIVFS); ch_key(SEAM_FS, ENDC_A);
                    ab_cap(YC_DIVFS); ch_cap(SEAM_FS, ENDC_A);       // hide tops (male)
                }
            }
            lap_shelf_Y(SEAM_KF, 0, AB_SEAM);           // chamber shelf -> knife_A (owns crossing)
            intersection() { lid_ledge(); cell(-1, AB_SEAM, FORK_Y0 + SEAM_EPS, FORK_Y1); }  // lid support ledge (none in fork-A)
        }
        lap_neg_X(FORK_Y0, FORK_Y1);                    // receive fork_B's A/B shelf
        ch_socket(SEAM_KF, ENDC_A);
        ch_cap_neg(SEAM_KF, ENDC_A);                    // top recess to receive knife_A's chamber cap (female)
        lap_neg_Y(SEAM_FS, 0, AB_SEAM, LAP_LEN_FS);     // receive spoon_A's (small) chamber shelf
        hinge_groove(); divider_lower(); lid_scallop();   // lid cuts (groove = fork-A hinge segment; divider = DIV_FS)
    }
}

module fork_B() {
    union() {
        difference() {
            union() {
                intersection() {
                    box();
                    union() {
                        cell(AB_SEAM, TOTAL_LEN + 1, FORK_Y0 + SEAM_EPS, FORK_Y1);  // -Y cut nudged off the divider face
                        ch_key(SEAM_FS, ENDC_B);
                        ch_cap(SEAM_FS, ENDC_B);                // hide top (male, chamber)
                    }
                }
                lap_shelf_X(FORK_Y0, FORK_Y1 - LAP_LEN_FS); // A/B shelf -> fork_A (CLIPPED at y=186 crossing)
                lap_shelf_Y(SEAM_KF, AB_SEAM, TOTAL_LEN);   // chamber shelf -> knife_B
                intersection() { lid_ledge(); cell(AB_SEAM, TOTAL_LEN + 1, FORK_Y0 + SEAM_EPS, FORK_Y1); }  // lid ledge (clip-end run)
            }
            ab_socket(YC_DIVFS);
            ab_cap_neg(YC_DIVFS);                           // top recess to receive fork_A's A/B cap (female)
            ch_socket(SEAM_KF, ENDC_B);
            ch_cap_neg(SEAM_KF, ENDC_B);                    // top recess to receive knife_B's chamber cap (female)
            lap_neg_Y(SEAM_FS, AB_SEAM, TOTAL_LEN, LAP_LEN_FS); // receive spoon_B's (small) chamber shelf
            hinge_groove(); divider_lower(); lid_scallop();     // lid cuts (scallop lands here)
        }
        intersection() { lid_clip(); cell(AB_SEAM, TOTAL_LEN + 1, FORK_Y0 + SEAM_EPS, FORK_Y1); }  // retaining clip, added AFTER the scallop cut
    }
}

module spoon_A() {
    difference() {
        union() {
            intersection() {
                box();
                union() {
                    cell(-1, AB_SEAM, SPOON_Y0 + SEAM_EPS, SPOON_Y1 + 1);  // -Y cut nudged off the divider face
                    ab_key(YC_OUTR);
                    ab_cap(YC_OUTR);                        // hide top (male)
                }
            }
            lap_shelf_Y(SEAM_FS, 0, AB_SEAM, LAP_LEN_FS); // chamber shelf -> fork_A (small; owns crossing)
            intersection() { lid_ledge(); cell(-1, AB_SEAM, SPOON_Y0 + SEAM_EPS, SPOON_Y1 + 1); }  // lid support ledge (OUTER_R run)
        }
        lap_neg_X(SPOON_Y0, SPOON_Y1);                  // receive spoon_B's A/B shelf
        ch_socket(SEAM_FS, ENDC_A);
        ch_cap_neg(SEAM_FS, ENDC_A);                    // top recess to receive fork_A's chamber cap (female)
        hinge_groove(); divider_lower(); lid_scallop();   // lid cuts (groove = spoon-A hinge segment)
    }
}

module spoon_B() {                                      // placed FIRST; owns shelves
    difference() {
        union() {
            intersection() {
                box();
                union() {
                    cell(AB_SEAM, TOTAL_LEN + 1, SPOON_Y0 + SEAM_EPS, SPOON_Y1 + 1);  // -Y cut nudged off the divider face
                }
            }
            lap_shelf_X(SPOON_Y0, SPOON_Y1);            // A/B shelf -> spoon_A
            lap_shelf_Y(SEAM_FS, AB_SEAM, TOTAL_LEN, LAP_LEN_FS); // chamber shelf -> fork_B (small)
            intersection() { lid_ledge(); cell(AB_SEAM, TOTAL_LEN + 1, SPOON_Y0 + SEAM_EPS, SPOON_Y1 + 1); }  // lid ledge (OUTER_R + clip-end runs)
        }
        ab_socket(YC_OUTR);
        ab_cap_neg(YC_OUTR);                            // top recess to receive spoon_A's A/B cap (female)
        ch_socket(SEAM_FS, ENDC_B);
        ch_cap_neg(SEAM_FS, ENDC_B);                    // top recess to receive fork_B's chamber cap (female)
        hinge_groove(); divider_lower(); lid_scallop();   // lid cuts
    }
}

// Fast preview: the full continuous-chamfer box (no cuts). The six part modules
// above are the real, separable pieces. To instead see the TRUE assembled
// pieces with their joints (slower — 6 booleans), replace box(); below with:
//   knife_A(); knife_B(); fork_A(); fork_B(); spoon_A(); spoon_B();
module assembly() {
    box();
}

// ============================================================================
// Render dispatch
// ============================================================================
if      (part == "knife_A")  knife_A();
else if (part == "knife_B")  knife_B();
else if (part == "fork_A")   fork_A();
else if (part == "fork_B")   fork_B();
else if (part == "spoon_A")  spoon_A();
else if (part == "spoon_B")  spoon_B();
else if (part == "assembly") assembly();
else echo(str("Unknown part: ", part));
